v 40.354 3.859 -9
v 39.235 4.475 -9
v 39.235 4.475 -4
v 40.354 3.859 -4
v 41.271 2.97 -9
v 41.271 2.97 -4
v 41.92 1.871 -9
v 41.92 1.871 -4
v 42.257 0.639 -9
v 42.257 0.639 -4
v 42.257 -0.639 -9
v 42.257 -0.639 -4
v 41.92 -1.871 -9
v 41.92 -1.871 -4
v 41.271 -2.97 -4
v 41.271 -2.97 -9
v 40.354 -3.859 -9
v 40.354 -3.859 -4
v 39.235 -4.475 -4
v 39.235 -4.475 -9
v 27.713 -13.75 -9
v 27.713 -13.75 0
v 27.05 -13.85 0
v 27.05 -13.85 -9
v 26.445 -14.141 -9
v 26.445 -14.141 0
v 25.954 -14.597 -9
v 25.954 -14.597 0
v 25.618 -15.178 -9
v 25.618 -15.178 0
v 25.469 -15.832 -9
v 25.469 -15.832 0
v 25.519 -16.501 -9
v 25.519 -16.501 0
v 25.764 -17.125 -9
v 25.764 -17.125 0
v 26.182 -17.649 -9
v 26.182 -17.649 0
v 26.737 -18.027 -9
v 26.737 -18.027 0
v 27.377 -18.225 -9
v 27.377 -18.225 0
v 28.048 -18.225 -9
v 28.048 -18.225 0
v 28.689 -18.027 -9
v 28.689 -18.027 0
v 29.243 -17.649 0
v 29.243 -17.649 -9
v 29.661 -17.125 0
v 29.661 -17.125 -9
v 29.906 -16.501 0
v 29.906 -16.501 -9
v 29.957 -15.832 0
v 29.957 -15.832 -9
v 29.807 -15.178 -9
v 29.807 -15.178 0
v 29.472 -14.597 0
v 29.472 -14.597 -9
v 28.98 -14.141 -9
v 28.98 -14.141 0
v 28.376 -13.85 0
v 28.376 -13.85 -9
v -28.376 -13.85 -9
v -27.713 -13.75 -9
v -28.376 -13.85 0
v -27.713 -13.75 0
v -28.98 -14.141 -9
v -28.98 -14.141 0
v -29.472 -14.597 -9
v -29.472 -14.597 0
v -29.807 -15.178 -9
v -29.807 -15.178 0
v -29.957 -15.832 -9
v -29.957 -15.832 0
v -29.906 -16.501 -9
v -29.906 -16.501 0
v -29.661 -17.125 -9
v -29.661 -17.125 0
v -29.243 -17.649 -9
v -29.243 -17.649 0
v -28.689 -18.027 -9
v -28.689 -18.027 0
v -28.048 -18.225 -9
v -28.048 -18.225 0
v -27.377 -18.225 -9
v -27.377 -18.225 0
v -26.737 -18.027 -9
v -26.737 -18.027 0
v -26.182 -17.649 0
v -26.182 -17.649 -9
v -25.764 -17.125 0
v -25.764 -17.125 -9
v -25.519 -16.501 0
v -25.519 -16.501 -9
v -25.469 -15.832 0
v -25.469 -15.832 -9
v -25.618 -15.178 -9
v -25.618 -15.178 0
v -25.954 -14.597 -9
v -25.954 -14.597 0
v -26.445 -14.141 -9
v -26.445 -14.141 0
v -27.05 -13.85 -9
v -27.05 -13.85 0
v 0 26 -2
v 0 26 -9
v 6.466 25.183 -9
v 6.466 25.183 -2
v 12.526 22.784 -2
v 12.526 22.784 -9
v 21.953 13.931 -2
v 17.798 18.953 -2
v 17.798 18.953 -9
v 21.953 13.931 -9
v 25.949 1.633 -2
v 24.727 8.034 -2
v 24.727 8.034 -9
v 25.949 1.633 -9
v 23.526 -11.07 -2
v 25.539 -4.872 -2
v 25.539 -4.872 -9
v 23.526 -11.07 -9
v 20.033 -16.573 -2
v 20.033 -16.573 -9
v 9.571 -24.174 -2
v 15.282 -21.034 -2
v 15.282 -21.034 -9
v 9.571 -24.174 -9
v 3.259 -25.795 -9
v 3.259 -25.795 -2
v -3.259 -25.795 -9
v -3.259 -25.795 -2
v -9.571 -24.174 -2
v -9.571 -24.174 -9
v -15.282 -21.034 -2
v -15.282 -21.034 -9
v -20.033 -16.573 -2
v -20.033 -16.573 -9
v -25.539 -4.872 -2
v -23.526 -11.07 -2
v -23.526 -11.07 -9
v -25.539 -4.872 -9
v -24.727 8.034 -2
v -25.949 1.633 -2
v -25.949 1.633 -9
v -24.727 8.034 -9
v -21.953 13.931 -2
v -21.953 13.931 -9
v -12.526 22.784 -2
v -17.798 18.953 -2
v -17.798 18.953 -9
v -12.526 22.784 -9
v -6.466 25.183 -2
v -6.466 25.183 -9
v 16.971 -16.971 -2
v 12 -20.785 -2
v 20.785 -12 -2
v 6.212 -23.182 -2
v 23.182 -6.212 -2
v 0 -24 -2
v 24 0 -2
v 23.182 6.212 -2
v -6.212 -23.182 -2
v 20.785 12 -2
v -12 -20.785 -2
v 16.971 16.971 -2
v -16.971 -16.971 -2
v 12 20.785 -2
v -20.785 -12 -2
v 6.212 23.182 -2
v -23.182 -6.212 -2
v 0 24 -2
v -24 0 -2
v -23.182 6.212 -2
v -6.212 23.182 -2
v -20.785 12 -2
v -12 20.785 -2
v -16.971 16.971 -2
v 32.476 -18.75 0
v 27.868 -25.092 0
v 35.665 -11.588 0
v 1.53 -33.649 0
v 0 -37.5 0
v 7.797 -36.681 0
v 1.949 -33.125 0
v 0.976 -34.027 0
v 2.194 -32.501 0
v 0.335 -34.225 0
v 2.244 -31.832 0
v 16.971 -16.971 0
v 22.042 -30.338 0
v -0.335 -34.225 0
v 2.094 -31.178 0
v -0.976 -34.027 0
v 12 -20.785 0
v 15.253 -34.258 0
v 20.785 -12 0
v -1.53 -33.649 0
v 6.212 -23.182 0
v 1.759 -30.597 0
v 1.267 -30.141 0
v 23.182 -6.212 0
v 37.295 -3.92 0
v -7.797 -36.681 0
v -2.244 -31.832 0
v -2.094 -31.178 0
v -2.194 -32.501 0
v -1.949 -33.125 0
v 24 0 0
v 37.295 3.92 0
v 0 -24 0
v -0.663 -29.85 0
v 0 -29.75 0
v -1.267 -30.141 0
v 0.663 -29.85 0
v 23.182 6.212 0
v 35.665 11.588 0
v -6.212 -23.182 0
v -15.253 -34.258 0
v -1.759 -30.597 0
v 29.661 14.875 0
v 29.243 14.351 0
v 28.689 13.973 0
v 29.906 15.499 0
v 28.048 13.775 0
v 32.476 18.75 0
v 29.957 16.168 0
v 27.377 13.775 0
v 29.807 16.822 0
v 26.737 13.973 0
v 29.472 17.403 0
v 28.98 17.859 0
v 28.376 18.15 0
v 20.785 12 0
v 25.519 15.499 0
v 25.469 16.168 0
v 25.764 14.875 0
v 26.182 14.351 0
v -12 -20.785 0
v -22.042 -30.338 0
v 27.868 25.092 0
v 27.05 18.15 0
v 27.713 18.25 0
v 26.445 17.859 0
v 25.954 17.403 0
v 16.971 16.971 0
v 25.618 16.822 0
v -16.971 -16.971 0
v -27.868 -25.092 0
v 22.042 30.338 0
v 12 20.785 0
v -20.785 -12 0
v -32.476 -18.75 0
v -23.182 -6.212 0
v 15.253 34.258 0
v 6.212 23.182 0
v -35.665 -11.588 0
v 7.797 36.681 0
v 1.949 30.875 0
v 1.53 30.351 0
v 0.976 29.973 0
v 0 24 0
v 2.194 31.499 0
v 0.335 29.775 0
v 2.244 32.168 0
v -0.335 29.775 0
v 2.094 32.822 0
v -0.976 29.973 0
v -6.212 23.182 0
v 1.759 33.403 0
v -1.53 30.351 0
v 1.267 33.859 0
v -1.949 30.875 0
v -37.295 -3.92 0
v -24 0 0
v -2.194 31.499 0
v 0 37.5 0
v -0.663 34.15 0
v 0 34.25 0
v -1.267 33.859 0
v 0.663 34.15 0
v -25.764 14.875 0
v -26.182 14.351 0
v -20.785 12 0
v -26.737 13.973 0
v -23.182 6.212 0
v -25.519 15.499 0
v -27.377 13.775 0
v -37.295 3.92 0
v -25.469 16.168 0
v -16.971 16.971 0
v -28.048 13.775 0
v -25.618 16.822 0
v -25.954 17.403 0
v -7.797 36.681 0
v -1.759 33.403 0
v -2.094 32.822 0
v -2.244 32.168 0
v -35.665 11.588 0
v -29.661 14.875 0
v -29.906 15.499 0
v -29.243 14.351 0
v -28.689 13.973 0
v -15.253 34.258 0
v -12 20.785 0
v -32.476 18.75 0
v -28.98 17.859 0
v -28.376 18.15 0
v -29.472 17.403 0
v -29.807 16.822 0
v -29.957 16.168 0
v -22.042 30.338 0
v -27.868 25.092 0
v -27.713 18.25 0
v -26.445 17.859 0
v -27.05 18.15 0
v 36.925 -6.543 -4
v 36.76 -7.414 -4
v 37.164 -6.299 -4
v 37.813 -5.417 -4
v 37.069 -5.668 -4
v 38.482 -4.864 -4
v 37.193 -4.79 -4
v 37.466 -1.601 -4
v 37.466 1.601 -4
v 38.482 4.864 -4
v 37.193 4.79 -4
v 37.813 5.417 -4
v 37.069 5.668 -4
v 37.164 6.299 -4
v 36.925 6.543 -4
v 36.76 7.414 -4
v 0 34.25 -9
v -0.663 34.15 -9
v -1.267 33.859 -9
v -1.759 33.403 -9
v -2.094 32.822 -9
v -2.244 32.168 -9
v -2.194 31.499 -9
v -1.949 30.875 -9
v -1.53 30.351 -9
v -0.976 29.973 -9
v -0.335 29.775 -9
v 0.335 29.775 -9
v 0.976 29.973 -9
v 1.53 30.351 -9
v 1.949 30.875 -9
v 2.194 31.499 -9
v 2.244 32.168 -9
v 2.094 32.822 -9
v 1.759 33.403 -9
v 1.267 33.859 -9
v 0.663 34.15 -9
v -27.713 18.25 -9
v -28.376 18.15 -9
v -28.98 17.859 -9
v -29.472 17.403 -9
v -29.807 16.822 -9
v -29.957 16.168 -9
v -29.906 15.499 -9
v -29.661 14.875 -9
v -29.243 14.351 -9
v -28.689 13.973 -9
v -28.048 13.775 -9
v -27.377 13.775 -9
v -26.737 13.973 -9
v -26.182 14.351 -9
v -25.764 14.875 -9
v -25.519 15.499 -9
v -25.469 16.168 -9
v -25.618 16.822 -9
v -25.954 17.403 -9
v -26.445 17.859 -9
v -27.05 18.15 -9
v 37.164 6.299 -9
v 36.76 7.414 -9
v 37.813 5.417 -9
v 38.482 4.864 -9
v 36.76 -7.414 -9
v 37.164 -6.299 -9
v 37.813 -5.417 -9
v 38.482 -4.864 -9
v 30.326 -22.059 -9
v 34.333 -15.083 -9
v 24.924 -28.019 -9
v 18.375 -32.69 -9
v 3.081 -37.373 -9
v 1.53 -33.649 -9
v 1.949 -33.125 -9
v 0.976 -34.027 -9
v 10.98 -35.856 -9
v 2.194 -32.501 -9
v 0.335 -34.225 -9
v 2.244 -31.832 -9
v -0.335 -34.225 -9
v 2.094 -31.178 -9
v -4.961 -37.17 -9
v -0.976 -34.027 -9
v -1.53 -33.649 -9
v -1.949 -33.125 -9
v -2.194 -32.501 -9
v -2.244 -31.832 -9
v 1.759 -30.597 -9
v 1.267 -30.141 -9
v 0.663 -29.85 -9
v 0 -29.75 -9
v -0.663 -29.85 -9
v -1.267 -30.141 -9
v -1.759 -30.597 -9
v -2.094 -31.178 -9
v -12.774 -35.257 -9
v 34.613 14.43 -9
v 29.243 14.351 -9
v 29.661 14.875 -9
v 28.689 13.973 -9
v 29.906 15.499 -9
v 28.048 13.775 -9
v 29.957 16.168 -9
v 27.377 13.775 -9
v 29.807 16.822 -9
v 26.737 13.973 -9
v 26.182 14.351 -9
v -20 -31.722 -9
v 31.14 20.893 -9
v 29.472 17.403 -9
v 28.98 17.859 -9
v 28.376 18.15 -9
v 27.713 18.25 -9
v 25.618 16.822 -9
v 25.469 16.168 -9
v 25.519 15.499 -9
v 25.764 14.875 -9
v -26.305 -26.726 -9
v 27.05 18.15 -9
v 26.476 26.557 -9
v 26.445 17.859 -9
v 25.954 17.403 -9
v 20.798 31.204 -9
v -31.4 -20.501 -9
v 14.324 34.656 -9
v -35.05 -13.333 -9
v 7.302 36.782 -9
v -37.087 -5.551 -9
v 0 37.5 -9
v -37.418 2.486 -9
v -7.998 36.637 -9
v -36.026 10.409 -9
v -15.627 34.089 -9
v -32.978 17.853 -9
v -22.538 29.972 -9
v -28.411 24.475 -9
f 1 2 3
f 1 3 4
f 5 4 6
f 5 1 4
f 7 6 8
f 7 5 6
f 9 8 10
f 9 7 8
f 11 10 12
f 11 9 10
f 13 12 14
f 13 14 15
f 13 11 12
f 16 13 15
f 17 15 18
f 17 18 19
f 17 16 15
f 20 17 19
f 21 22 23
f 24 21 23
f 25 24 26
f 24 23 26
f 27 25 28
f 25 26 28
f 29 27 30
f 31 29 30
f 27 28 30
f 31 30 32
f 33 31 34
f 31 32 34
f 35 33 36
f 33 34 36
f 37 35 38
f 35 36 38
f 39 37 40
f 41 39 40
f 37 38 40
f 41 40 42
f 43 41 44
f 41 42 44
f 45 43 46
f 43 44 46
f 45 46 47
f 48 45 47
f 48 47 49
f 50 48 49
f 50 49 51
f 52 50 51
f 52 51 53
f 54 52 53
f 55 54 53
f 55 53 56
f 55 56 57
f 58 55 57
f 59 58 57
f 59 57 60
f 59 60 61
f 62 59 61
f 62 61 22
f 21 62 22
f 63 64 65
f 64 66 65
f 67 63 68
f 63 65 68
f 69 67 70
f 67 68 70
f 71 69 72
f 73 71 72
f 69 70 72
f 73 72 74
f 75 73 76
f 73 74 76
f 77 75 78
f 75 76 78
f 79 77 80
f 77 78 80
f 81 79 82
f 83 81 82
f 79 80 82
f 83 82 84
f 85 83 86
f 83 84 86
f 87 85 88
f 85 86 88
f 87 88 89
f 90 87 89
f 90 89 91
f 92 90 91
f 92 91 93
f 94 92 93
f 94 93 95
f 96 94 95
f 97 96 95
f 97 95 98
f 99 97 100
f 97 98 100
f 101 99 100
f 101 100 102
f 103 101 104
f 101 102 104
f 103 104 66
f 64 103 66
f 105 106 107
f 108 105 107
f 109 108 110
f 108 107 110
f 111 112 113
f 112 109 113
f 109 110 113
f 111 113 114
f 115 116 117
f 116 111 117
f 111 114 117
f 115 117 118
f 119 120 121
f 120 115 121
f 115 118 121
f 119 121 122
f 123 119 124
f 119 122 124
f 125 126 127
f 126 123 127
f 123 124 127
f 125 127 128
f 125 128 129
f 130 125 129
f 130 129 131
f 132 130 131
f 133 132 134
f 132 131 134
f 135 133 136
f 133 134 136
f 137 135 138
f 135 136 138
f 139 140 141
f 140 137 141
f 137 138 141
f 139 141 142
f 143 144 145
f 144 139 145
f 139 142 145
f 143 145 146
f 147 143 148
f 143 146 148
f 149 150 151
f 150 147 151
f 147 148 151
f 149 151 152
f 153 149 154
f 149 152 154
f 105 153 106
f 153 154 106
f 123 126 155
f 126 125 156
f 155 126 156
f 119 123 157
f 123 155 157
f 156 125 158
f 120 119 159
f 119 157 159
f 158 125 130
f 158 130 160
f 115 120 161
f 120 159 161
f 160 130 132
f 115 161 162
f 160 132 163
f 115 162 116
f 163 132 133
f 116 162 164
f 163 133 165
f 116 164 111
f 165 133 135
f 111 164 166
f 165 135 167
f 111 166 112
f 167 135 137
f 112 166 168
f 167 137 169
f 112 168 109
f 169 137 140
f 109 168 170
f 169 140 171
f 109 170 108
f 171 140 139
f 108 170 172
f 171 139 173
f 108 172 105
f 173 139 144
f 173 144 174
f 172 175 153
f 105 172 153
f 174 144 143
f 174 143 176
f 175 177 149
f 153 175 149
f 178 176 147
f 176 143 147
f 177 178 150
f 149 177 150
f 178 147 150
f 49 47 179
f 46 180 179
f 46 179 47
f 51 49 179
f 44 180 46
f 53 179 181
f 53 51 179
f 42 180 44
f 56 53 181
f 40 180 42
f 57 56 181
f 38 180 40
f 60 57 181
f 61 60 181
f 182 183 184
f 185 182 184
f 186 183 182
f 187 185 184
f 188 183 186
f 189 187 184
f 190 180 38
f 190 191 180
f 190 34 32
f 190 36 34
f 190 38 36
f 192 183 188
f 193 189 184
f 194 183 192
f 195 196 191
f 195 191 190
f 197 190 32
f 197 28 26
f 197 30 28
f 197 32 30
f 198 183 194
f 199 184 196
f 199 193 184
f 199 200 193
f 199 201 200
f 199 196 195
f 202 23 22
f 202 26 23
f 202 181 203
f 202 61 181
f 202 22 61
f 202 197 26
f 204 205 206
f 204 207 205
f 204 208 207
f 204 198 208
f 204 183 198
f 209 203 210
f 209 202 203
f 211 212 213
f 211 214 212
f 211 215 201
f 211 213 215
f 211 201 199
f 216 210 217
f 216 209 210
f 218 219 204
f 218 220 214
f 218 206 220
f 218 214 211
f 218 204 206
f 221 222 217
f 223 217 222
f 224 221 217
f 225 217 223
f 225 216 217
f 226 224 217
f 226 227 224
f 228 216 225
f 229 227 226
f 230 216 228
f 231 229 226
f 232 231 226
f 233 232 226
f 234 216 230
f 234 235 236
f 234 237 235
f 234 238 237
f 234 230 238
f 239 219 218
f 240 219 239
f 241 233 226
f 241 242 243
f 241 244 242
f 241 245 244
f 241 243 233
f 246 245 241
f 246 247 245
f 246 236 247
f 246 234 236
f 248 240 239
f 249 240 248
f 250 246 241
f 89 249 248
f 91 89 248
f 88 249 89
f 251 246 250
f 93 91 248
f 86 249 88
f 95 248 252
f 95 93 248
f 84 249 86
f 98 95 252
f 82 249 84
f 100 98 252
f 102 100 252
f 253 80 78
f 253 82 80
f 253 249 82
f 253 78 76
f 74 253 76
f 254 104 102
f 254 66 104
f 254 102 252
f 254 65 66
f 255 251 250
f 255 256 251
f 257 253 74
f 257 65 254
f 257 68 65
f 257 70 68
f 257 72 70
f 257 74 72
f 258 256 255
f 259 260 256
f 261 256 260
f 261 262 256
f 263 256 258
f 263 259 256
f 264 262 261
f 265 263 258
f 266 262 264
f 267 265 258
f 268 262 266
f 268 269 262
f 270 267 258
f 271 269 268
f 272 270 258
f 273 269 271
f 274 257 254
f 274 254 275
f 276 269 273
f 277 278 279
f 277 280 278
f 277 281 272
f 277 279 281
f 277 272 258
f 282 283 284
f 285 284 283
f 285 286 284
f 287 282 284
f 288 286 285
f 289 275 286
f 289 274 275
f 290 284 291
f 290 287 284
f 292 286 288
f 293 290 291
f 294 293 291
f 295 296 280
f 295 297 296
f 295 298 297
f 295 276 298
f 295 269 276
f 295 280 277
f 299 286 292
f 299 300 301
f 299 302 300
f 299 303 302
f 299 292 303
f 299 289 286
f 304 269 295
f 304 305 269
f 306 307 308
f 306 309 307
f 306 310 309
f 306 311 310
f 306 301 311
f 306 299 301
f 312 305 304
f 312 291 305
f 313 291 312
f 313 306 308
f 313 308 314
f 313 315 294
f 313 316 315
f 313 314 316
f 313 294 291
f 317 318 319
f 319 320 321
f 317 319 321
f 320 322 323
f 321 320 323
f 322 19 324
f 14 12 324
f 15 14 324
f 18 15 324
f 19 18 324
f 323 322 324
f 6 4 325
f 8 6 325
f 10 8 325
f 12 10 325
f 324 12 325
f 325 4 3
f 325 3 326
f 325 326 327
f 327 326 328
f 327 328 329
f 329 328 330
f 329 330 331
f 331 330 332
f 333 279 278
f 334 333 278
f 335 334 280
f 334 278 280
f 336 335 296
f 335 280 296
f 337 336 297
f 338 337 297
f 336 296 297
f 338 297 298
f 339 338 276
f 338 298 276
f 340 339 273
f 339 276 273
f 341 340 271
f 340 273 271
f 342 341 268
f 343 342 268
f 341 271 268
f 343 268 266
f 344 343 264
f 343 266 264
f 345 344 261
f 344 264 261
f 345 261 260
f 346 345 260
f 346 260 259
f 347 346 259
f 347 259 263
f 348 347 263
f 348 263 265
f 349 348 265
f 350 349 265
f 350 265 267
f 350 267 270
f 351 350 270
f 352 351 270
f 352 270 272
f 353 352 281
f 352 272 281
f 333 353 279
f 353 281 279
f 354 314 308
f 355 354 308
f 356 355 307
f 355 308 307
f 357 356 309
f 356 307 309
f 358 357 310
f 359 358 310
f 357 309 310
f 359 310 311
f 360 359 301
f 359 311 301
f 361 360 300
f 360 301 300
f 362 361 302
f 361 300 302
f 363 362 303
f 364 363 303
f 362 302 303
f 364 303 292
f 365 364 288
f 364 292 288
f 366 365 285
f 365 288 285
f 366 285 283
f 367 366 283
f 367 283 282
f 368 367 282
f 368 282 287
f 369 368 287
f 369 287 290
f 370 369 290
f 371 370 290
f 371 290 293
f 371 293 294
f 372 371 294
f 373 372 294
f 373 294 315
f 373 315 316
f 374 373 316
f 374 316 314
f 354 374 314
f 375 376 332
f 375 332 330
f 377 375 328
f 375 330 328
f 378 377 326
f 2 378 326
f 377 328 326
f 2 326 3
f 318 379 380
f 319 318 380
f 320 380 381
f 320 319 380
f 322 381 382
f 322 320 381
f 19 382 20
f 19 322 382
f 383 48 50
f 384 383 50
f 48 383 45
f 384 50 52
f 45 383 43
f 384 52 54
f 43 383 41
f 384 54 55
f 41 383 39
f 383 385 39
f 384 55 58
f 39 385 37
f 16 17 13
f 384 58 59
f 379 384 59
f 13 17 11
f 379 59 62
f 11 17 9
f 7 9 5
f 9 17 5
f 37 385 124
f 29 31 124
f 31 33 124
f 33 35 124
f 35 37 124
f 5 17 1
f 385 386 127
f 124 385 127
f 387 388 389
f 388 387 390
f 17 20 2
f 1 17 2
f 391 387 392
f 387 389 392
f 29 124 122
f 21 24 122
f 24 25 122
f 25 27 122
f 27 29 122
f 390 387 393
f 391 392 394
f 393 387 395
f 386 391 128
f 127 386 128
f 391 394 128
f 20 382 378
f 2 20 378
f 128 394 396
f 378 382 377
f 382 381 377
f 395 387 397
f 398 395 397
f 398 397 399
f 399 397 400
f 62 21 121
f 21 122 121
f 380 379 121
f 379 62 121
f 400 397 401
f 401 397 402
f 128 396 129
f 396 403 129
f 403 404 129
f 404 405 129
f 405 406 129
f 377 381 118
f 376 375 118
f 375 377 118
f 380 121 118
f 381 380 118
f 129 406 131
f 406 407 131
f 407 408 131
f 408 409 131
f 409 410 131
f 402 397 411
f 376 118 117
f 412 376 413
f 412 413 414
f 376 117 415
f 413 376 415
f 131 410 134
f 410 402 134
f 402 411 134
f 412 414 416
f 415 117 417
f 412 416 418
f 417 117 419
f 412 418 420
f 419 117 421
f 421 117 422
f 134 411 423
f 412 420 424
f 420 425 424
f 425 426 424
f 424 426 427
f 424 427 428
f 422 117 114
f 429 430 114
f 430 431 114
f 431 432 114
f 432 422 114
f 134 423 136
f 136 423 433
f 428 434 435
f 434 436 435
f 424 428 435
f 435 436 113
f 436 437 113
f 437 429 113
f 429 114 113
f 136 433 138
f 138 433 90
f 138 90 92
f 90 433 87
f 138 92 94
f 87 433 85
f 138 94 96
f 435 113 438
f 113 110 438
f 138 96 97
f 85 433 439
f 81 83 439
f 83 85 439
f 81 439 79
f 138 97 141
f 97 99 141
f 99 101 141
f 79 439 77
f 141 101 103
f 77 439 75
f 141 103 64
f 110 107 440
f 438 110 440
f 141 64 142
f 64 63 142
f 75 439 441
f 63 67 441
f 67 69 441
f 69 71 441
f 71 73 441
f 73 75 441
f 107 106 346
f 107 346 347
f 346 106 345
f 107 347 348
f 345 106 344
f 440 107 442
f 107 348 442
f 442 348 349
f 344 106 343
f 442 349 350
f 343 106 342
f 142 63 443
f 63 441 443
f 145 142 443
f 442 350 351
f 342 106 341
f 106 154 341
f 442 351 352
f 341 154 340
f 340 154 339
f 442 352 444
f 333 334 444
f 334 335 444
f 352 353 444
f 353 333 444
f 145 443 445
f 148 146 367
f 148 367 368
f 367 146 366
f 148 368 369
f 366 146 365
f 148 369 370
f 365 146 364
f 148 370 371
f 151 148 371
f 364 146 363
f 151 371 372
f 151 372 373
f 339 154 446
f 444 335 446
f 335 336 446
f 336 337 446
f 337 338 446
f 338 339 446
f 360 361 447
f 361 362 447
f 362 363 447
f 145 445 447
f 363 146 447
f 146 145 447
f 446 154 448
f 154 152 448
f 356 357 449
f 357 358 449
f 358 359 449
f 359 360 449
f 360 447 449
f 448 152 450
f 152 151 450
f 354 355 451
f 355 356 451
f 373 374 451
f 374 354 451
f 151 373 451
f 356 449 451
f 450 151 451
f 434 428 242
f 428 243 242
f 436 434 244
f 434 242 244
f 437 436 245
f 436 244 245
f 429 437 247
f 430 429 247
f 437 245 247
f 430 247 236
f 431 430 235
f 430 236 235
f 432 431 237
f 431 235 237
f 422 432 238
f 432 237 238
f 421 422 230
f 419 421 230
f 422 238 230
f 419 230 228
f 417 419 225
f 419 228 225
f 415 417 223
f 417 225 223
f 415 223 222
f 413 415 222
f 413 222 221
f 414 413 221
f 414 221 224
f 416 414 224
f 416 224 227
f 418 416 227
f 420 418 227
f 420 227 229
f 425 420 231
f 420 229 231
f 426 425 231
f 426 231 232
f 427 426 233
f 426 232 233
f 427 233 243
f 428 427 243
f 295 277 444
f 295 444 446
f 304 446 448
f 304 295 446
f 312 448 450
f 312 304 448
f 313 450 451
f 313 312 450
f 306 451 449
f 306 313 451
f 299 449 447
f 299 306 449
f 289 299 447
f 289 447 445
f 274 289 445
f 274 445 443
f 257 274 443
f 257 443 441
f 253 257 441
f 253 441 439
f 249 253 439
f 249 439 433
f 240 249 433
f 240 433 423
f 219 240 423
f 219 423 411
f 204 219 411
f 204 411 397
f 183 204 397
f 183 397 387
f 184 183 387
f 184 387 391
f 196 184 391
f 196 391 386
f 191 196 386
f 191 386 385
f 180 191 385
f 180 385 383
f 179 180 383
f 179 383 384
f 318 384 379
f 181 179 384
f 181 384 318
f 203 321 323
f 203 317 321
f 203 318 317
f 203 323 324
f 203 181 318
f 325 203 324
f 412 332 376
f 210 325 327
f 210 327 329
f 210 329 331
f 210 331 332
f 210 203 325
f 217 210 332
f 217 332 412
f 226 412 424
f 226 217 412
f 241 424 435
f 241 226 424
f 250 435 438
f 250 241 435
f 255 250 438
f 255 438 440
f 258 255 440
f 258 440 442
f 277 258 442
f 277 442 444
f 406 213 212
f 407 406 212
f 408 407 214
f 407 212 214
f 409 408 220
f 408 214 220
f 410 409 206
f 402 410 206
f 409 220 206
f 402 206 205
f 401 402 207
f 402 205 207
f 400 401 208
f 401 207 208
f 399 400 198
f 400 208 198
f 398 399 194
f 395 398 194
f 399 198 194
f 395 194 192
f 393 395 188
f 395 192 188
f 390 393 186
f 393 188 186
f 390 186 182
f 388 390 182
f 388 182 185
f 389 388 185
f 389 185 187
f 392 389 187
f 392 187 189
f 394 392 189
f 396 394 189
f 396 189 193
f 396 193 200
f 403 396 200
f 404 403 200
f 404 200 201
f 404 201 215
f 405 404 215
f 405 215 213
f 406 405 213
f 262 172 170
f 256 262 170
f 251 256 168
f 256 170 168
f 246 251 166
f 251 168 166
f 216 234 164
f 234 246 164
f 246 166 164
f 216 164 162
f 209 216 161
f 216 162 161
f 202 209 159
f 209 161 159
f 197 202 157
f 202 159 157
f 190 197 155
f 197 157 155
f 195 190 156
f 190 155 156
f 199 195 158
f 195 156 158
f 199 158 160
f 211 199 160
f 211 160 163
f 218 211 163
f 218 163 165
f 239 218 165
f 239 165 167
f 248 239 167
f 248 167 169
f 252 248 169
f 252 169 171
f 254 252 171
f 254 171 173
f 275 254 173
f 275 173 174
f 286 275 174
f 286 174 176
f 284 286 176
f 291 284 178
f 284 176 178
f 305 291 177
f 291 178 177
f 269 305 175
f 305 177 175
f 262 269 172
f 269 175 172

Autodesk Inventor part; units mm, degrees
ref_plane "YZ Plane" through (0, 0, 0) normal (1, 0, 0) x (0, 1, 0)
ref_plane "XZ Plane" through (0, 0, 0) normal (0, 1, 0) x (-1, 0, 0)
ref_plane "XY Plane" through (0, 0, 0) normal (0, 0, 1) x (1, 0, 0)
sketch "スケッチ1" plane through (0, 0, 0) normal (1, 0, 0) x (0, 1, 0)
  line L0 (24, 0) -> (24, -2)
  line L1 (24, -2) -> (26, -2)
  line L2 (26, -2) -> (26, -9)
  line L3 (26, -9) -> (37.5, -9)
  line L4 (37.5, -9) -> (37.5, 0)
  line L5 (37.5, 0) -> (24, 0)
  line L6 (0, -10.8) -> (0, 1.8) projected
  point P0 (0, 0)
  dimension "d0" = 26
  dimension "d1" = 37.5
  dimension "d2" = 7
  dimension "d3" = 2
  dimension "d4" = 2
revolve "回転1" add sketch "スケッチ1" angle 360 about axis through (0, 0, -10) along (0, 0, 1)
sketch "スケッチ2" plane through (0, 0, -9) normal (0, 0, -1) x (-1, 0, 0)
  circle A0 centre (0, 0) radius 32
  point P0 (0, 32)
  point P1 (-27.7128, 16)
  point P2 (-27.7128, -16)
  point P3 (0, -32)
  point P4 (27.7128, -16)
  point P5 (27.7128, 16)
  dimension "d6" = 64
  dimension "d9" = 360
hole "穴1" at (0, 32, -9) at (27.7128, 16, -9) at (27.7128, -16, -9) at (0, -32, -9) at (-27.7128, -16, -9) at (-27.7128, 16, -9) direction (0, 0, 1) diameter 4.5 end through all clearance for "Socket Head Cap Screw" size "M4" standard "Ansi Metric M Profile"
sketch "スケッチ3" plane through (0, 0, -9) normal (0, 0, -1) x (-1, 0, 0)
  circle A0 centre (-37.5, 0) radius 4.8
  circle A1 centre (0, 0) radius 37.5 projected
  point P0 (-37.1928, 4.7902)
  point P1 (-37.1928, -4.7902)
  dimension "d18" = 9.6
extrude "押し出し1" add sketch "スケッチ3" against normal blind 5 contours A1 A0 picked at (-39.0772, 0)
fillet "フィレット1" radius 4 2 edges at (37.1928, 4.7902, -6.5) (37.1928, -4.7902, -6.5)
properties part number "unit-base1" material "ABS プラスチック"
